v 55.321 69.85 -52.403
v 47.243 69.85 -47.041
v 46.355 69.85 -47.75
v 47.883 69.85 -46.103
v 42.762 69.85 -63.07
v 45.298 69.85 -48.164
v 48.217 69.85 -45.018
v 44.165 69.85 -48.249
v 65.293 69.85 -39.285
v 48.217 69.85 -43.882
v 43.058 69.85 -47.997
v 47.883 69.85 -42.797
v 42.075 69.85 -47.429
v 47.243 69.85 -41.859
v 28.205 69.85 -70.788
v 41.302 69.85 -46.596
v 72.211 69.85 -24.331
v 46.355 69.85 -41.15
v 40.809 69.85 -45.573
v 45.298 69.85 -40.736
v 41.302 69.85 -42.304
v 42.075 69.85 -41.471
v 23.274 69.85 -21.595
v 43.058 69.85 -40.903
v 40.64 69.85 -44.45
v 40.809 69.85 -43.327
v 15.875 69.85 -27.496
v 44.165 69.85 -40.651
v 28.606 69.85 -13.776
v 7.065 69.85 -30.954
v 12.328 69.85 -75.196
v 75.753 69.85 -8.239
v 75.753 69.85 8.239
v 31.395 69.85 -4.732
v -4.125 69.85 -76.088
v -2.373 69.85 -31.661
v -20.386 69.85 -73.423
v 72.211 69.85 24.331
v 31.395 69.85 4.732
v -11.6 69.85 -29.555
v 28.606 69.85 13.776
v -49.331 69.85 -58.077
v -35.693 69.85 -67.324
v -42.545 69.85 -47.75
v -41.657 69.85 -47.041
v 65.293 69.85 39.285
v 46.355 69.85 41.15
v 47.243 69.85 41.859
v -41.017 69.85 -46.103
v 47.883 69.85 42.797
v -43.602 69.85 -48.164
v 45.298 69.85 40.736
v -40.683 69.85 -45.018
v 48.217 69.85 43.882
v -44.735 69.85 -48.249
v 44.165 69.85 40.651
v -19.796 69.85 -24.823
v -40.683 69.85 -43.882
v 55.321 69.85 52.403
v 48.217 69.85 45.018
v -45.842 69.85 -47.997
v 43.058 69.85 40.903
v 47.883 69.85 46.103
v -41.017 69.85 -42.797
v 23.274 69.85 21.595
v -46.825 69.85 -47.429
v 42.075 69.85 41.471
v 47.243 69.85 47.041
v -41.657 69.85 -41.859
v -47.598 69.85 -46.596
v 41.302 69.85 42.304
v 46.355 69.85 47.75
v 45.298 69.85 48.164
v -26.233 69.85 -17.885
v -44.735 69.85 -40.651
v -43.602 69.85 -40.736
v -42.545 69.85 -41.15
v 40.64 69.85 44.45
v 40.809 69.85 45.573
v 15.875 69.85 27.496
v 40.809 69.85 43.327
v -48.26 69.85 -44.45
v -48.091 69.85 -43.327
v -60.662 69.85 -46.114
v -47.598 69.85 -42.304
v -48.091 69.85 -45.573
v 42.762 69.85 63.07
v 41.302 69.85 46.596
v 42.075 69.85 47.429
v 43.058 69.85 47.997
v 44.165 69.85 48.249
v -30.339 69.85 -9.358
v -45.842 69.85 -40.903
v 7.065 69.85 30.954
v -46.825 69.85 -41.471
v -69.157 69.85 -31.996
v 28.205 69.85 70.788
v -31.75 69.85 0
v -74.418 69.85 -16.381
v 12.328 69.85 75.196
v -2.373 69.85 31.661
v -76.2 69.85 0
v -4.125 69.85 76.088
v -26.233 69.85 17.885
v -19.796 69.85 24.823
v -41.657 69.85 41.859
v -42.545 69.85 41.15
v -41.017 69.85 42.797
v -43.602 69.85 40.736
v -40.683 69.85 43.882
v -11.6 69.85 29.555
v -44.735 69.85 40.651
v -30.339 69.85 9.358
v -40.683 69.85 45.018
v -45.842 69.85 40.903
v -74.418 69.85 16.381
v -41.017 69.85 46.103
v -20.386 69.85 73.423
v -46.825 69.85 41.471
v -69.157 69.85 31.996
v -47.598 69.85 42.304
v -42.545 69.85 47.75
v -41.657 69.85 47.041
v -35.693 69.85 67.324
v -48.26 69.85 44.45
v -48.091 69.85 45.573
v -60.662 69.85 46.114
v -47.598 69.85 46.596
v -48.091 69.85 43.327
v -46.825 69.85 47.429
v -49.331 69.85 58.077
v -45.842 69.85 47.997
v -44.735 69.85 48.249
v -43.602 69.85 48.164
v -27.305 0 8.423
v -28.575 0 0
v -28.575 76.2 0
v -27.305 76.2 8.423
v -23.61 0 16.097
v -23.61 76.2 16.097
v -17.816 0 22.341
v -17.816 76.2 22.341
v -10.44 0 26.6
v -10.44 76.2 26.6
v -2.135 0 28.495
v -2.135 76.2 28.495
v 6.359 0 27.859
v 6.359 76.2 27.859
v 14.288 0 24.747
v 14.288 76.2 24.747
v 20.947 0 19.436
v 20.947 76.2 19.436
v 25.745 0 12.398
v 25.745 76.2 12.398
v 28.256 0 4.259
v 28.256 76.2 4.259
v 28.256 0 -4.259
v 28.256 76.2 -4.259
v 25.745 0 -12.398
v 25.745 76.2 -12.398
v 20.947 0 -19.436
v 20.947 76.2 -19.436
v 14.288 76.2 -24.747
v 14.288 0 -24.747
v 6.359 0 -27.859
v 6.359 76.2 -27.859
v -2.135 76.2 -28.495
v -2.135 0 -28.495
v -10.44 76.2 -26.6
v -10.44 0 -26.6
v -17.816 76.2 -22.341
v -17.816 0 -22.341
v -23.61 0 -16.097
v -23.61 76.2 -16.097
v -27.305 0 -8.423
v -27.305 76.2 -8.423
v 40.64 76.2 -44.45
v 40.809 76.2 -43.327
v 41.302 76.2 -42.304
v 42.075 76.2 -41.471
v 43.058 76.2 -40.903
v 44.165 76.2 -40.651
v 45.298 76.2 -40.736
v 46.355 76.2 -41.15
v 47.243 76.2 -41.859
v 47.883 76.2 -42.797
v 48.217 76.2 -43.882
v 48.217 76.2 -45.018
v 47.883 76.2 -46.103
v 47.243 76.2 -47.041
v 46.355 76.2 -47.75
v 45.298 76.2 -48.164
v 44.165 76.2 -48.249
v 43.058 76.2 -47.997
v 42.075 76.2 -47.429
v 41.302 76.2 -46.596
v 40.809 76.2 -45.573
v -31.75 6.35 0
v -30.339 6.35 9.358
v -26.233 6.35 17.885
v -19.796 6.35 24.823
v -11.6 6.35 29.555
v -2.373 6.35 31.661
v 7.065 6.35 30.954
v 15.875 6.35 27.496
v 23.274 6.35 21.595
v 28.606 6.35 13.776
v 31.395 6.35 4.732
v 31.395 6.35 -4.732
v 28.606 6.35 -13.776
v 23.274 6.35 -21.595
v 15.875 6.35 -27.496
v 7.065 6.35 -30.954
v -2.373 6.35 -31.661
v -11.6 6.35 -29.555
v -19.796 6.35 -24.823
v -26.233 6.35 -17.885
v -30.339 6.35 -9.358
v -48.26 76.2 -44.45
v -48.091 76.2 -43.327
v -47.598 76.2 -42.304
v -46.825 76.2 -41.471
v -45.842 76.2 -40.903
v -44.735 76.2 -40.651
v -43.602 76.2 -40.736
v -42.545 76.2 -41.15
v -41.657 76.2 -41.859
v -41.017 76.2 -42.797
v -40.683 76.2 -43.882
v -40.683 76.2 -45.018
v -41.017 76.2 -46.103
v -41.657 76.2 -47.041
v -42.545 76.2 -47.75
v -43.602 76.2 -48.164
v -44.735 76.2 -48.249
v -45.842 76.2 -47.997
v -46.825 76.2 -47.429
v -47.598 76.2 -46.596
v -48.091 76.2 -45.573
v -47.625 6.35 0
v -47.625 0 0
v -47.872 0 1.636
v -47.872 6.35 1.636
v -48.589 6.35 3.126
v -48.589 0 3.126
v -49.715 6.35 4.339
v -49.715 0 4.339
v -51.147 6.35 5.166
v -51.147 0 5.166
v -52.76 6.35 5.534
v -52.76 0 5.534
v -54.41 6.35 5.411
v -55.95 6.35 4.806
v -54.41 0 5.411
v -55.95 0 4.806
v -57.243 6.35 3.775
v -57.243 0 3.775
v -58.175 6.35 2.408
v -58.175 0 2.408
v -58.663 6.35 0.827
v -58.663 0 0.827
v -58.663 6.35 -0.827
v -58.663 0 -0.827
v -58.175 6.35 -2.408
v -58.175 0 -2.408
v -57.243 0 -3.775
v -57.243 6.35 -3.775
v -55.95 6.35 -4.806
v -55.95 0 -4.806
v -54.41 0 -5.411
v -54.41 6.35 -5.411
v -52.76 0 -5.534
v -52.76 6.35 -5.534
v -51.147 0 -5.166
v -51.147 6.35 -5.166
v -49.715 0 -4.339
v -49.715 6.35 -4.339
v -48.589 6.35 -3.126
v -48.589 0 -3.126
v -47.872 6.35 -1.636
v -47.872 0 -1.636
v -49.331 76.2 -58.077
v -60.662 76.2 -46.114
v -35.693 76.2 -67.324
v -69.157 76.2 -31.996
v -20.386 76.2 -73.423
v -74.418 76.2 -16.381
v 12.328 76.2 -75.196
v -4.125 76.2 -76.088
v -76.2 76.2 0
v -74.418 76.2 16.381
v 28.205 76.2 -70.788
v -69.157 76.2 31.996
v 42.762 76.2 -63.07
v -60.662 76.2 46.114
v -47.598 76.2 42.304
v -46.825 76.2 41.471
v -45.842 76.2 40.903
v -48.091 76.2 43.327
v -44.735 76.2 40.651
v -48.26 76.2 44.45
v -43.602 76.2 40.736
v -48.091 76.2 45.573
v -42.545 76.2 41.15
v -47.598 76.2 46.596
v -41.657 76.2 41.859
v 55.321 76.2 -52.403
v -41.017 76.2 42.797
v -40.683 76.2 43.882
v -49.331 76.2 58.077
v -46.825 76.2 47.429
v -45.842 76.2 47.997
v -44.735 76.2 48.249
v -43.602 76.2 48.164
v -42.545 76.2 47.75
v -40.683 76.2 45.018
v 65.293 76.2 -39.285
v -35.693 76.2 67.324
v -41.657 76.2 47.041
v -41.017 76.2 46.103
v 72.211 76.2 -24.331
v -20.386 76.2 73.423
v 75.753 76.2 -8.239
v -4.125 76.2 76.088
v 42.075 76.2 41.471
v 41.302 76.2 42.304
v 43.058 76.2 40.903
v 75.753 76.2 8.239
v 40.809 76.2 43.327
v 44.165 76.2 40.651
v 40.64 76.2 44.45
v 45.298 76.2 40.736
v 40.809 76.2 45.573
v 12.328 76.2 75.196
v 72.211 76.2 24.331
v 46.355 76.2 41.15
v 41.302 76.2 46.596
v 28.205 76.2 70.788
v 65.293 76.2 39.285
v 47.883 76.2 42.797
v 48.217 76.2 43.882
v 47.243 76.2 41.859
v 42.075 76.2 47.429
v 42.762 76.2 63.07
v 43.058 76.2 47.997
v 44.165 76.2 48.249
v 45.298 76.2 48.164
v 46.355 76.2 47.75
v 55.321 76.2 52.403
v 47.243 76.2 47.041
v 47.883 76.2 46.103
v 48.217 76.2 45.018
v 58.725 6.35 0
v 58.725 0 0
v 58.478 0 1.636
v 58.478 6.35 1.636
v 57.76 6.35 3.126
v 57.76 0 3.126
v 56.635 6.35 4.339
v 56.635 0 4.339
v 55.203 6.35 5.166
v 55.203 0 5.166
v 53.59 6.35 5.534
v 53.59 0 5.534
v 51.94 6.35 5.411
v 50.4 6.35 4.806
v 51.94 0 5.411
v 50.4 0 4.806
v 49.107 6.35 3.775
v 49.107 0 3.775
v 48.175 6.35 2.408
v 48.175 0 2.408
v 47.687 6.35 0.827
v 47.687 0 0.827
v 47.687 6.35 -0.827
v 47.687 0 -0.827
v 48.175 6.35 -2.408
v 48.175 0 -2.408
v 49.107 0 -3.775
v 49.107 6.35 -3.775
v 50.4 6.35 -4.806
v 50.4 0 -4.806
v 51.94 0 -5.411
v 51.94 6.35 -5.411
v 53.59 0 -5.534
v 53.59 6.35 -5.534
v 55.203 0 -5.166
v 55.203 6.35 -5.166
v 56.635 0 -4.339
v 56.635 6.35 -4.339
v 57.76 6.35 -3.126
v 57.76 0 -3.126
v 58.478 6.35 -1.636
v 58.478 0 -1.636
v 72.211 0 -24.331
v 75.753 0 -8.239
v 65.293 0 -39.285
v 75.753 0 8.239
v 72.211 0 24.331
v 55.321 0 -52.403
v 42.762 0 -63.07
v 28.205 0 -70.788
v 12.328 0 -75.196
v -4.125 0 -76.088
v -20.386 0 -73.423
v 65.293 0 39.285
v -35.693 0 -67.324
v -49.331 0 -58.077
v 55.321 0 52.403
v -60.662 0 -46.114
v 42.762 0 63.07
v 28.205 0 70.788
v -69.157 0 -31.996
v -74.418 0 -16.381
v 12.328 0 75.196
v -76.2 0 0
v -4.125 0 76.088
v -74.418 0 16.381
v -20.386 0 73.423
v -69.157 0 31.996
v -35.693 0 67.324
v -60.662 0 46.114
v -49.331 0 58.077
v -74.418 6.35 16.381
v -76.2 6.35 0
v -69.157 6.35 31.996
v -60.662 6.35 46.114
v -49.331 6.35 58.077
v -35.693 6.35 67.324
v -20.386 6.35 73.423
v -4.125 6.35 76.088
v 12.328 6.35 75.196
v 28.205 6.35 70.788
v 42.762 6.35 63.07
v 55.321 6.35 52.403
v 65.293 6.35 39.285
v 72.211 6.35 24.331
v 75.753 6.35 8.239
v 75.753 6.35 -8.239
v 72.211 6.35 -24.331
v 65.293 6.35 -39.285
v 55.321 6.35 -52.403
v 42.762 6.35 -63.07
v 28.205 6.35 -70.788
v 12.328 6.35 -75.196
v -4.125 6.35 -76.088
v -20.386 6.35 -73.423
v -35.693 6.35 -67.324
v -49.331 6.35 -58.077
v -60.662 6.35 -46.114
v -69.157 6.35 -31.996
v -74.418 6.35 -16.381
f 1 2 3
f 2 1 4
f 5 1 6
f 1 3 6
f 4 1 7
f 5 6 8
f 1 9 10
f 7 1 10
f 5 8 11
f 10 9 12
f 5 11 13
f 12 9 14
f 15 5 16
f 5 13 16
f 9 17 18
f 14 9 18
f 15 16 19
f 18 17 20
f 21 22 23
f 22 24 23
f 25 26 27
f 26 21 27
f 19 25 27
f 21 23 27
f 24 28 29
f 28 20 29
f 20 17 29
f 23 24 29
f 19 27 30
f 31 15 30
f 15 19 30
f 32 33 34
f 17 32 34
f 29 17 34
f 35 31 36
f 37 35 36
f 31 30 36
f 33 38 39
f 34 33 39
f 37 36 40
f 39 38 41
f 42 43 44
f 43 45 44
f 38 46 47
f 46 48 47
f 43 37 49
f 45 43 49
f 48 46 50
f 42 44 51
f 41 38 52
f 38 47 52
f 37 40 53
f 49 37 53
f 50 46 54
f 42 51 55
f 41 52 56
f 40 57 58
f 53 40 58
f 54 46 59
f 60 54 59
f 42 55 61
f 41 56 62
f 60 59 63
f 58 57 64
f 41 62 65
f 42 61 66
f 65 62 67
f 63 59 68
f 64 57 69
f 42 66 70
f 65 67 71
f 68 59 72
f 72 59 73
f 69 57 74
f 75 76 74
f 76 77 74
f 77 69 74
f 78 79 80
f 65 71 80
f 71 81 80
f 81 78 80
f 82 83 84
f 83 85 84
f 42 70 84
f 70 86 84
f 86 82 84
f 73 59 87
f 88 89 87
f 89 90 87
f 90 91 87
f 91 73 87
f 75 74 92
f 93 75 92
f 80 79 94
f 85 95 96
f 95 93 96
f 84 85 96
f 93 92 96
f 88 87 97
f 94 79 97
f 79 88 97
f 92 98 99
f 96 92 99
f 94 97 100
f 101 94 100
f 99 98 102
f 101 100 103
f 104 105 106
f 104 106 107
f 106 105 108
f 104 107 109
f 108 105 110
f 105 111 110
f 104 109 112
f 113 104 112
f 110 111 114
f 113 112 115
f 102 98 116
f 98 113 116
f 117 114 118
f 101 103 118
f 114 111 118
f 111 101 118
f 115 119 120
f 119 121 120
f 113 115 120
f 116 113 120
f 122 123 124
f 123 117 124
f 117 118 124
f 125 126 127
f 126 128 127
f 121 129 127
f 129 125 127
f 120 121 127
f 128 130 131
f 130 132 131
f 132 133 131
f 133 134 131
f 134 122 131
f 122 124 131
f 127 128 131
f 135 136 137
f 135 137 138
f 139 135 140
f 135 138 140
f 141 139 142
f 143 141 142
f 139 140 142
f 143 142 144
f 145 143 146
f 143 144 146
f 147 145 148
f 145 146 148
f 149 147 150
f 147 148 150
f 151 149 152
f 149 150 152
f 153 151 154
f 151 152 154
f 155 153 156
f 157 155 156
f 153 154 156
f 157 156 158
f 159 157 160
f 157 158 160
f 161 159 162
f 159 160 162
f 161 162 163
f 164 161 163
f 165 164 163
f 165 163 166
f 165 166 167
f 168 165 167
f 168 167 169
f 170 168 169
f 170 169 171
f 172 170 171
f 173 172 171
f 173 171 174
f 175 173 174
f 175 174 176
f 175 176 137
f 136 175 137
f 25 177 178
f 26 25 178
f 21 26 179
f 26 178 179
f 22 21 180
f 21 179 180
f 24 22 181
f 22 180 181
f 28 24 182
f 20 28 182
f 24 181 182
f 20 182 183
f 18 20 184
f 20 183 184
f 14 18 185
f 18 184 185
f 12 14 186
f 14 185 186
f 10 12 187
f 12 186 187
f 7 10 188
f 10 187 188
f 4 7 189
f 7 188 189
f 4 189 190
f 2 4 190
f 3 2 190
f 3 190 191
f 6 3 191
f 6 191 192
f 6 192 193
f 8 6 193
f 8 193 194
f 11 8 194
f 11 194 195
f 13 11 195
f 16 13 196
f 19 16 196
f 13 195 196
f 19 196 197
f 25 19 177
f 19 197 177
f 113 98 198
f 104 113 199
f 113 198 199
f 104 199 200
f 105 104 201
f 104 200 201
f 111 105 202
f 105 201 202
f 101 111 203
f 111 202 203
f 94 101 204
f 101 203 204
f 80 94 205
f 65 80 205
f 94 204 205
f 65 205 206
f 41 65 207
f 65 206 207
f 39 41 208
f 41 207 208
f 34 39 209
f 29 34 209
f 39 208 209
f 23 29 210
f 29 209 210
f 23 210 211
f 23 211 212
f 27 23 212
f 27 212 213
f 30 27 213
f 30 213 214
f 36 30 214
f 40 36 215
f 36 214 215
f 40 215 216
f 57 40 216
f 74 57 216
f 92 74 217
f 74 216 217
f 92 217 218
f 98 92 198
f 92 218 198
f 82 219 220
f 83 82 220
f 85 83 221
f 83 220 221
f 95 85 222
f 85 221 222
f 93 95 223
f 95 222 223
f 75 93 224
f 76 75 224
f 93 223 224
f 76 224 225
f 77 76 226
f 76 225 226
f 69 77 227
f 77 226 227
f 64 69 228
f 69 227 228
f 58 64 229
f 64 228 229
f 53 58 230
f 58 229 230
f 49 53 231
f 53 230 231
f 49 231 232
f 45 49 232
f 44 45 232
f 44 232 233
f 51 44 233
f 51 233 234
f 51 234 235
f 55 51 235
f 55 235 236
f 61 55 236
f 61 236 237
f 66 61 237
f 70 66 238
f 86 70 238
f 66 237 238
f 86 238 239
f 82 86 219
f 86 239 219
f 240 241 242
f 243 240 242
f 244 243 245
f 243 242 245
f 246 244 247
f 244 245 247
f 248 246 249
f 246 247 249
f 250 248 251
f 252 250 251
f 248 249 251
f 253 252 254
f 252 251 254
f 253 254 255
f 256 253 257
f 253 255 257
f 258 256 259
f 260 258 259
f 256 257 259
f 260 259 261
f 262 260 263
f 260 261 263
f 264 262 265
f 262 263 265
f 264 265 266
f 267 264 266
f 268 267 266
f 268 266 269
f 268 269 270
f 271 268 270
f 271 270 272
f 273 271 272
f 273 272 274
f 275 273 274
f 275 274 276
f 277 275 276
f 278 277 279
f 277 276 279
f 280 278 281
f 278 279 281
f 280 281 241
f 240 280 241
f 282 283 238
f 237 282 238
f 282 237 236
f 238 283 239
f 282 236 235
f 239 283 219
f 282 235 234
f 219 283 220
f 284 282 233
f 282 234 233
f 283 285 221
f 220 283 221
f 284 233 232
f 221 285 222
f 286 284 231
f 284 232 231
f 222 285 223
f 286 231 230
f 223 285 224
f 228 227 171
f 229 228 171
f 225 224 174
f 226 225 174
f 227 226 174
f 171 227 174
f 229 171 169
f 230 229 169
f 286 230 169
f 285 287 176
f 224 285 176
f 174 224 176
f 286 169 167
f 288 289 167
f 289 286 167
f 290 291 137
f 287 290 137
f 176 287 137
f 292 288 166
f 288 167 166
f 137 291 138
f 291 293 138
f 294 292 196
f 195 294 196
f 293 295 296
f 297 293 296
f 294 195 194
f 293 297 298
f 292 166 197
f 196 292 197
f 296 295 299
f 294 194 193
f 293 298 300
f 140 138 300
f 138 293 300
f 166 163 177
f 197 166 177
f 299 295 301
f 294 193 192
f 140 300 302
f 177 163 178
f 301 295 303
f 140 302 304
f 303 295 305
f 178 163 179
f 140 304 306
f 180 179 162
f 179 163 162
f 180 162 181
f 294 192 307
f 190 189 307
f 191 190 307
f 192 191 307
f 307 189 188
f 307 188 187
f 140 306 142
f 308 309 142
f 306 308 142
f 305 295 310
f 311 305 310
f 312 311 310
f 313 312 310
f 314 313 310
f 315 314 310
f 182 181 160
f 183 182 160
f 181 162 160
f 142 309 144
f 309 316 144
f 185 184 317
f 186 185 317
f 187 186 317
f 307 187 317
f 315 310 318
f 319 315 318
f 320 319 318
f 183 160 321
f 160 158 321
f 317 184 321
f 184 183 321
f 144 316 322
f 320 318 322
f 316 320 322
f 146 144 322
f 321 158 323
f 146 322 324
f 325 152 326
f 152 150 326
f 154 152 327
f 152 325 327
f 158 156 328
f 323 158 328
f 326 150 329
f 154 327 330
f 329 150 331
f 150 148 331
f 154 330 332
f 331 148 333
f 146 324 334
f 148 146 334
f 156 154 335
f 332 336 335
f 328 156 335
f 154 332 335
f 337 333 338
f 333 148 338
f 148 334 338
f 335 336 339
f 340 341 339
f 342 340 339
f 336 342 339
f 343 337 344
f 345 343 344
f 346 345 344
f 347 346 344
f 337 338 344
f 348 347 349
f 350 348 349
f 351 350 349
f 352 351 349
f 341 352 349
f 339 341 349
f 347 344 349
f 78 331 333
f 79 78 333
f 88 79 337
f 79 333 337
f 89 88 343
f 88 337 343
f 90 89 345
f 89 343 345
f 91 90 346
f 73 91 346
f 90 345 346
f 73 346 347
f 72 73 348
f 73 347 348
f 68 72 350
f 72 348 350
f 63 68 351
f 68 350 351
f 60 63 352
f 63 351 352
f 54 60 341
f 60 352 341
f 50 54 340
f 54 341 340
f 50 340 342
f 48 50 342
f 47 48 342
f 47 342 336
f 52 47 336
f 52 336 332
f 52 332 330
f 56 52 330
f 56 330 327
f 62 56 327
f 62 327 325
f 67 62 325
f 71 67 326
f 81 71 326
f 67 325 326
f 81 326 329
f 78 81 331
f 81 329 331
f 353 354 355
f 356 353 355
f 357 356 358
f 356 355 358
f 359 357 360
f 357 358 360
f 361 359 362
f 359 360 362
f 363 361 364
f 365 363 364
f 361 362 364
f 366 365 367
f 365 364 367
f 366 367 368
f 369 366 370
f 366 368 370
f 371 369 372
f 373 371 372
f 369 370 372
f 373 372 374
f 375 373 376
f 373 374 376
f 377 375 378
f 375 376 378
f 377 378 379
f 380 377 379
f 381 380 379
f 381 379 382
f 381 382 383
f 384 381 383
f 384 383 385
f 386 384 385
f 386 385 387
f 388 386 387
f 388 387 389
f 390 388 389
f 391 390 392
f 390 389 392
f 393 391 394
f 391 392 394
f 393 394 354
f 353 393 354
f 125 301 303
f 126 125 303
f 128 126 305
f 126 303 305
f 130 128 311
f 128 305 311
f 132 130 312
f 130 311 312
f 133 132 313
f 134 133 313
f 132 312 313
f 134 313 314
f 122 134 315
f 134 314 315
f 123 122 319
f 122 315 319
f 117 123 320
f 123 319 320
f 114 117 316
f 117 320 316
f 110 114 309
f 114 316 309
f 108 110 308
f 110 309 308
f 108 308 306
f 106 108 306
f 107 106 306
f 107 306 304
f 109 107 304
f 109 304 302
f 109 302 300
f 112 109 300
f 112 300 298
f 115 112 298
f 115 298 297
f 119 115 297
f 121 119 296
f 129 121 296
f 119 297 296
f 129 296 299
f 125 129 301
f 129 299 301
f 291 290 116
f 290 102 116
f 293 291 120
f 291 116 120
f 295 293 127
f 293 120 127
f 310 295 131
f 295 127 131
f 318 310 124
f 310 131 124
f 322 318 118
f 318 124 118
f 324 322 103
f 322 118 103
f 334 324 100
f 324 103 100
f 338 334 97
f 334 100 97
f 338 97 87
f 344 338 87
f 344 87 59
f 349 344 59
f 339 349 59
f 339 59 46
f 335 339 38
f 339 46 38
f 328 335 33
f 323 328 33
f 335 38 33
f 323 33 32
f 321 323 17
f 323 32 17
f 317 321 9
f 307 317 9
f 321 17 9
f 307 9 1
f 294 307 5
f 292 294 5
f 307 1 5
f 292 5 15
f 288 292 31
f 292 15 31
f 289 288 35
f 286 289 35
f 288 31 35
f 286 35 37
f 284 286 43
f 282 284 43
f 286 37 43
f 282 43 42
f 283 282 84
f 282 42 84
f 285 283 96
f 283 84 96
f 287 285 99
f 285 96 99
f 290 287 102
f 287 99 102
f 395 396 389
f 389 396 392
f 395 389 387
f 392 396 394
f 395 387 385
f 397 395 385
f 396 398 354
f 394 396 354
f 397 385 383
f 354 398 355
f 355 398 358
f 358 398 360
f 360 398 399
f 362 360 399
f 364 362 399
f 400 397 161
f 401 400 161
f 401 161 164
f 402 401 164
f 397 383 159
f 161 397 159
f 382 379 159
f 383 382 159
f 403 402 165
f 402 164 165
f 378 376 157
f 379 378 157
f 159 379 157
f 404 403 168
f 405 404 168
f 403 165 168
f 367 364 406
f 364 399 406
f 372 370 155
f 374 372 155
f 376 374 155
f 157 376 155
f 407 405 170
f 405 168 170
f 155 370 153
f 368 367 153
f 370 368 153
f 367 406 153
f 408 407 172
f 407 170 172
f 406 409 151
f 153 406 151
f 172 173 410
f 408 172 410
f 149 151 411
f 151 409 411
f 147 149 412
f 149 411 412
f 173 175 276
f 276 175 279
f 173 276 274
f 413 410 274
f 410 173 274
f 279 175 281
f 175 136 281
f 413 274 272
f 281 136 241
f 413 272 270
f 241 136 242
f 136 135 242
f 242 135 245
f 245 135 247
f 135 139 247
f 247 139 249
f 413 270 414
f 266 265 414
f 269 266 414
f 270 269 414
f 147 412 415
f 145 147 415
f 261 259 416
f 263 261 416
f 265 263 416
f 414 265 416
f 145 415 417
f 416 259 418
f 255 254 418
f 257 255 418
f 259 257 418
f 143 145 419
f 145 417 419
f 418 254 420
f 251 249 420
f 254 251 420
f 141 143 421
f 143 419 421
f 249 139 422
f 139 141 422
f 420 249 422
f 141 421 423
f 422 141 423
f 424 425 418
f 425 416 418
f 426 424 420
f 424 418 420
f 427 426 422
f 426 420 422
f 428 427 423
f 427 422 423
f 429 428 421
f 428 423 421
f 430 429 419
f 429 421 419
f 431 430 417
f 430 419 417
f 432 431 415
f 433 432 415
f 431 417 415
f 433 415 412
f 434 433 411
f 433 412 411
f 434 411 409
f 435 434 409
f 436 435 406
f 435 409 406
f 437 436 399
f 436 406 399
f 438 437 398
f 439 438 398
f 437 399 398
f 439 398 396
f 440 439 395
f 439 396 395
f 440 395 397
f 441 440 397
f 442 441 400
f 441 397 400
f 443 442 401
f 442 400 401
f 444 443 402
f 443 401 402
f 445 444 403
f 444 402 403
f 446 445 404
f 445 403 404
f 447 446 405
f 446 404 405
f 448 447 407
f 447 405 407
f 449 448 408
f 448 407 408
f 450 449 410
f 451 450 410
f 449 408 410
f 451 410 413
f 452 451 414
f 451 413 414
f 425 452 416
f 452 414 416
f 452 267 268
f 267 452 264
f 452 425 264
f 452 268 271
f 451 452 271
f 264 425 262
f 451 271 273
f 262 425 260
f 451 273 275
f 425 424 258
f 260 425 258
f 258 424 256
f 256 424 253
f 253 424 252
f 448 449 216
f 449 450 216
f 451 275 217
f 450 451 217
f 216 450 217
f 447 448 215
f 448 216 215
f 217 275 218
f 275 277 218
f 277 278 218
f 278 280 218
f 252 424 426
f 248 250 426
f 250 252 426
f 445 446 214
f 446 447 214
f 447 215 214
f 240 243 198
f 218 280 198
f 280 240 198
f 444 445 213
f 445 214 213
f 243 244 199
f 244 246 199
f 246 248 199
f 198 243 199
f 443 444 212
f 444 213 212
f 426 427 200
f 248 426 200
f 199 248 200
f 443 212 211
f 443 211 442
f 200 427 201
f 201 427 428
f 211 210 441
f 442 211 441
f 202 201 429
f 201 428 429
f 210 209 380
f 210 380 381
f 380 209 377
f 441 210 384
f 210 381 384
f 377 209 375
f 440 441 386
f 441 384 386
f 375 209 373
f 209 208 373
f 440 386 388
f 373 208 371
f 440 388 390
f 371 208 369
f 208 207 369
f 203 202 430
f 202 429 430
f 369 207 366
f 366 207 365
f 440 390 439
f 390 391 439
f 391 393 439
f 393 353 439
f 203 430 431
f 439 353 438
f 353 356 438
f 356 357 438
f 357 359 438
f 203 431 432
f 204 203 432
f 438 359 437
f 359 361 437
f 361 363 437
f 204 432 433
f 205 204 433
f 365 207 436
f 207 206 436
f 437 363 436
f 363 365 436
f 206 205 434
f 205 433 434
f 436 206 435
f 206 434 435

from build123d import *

# Parameters (mm, degrees)
SKETCH001_R     = 5.5499
POCKET_DEPTH    = 6.35
SKETCH002_R     = 28.575
POCKET001_DEPTH = 152.4
SKETCH003_R     = 3.81
POCKET002_DEPTH = 6.35


with BuildPart() as part:
    # Sketch → Revolution (revolve)
    with BuildSketch(Plane.XY):
        Polygon((0, 76.2), (-76.2, 76.2), (-76.2, 69.85), (-31.75, 69.85), (-31.75, 6.35), (-76.2, 6.35), (-76.2, 0), (0, 0), align=None)
    revolve(axis=Axis((0, 0, 0), (0, 1, 0)))

    # Sketch001 → Pocket (cut)
    with BuildSketch(Plane.XZ):
        with Locations((-53.1749, 0)):
            Circle(SKETCH001_R)
        with Locations((53.1749, 0)):
            Circle(SKETCH001_R)
    extrude(amount=-POCKET_DEPTH, mode=Mode.SUBTRACT)

    # Sketch002 → Pocket001 (cut)
    with BuildSketch(Plane(origin=(0, 76.2, 0), x_dir=(-1, 0, 0), z_dir=(0, 1, 0))):
        Circle(SKETCH002_R)
    extrude(amount=-POCKET001_DEPTH, mode=Mode.SUBTRACT)

    # Sketch003 → Pocket002 (cut)
    with BuildSketch(Plane(origin=(0, 76.2, 0), x_dir=(-1, 0, 0), z_dir=(0, 1, 0))):
        with Locations((-44.45, 44.45)):
            Circle(SKETCH003_R)
        with Locations((44.45, -44.45)):
            Circle(SKETCH003_R)
        with Locations((44.45, 44.45)):
            Circle(SKETCH003_R)
        with Locations((-44.45, -44.45)):
            Circle(SKETCH003_R)
    extrude(amount=-POCKET002_DEPTH, mode=Mode.SUBTRACT)


solid = part.part
